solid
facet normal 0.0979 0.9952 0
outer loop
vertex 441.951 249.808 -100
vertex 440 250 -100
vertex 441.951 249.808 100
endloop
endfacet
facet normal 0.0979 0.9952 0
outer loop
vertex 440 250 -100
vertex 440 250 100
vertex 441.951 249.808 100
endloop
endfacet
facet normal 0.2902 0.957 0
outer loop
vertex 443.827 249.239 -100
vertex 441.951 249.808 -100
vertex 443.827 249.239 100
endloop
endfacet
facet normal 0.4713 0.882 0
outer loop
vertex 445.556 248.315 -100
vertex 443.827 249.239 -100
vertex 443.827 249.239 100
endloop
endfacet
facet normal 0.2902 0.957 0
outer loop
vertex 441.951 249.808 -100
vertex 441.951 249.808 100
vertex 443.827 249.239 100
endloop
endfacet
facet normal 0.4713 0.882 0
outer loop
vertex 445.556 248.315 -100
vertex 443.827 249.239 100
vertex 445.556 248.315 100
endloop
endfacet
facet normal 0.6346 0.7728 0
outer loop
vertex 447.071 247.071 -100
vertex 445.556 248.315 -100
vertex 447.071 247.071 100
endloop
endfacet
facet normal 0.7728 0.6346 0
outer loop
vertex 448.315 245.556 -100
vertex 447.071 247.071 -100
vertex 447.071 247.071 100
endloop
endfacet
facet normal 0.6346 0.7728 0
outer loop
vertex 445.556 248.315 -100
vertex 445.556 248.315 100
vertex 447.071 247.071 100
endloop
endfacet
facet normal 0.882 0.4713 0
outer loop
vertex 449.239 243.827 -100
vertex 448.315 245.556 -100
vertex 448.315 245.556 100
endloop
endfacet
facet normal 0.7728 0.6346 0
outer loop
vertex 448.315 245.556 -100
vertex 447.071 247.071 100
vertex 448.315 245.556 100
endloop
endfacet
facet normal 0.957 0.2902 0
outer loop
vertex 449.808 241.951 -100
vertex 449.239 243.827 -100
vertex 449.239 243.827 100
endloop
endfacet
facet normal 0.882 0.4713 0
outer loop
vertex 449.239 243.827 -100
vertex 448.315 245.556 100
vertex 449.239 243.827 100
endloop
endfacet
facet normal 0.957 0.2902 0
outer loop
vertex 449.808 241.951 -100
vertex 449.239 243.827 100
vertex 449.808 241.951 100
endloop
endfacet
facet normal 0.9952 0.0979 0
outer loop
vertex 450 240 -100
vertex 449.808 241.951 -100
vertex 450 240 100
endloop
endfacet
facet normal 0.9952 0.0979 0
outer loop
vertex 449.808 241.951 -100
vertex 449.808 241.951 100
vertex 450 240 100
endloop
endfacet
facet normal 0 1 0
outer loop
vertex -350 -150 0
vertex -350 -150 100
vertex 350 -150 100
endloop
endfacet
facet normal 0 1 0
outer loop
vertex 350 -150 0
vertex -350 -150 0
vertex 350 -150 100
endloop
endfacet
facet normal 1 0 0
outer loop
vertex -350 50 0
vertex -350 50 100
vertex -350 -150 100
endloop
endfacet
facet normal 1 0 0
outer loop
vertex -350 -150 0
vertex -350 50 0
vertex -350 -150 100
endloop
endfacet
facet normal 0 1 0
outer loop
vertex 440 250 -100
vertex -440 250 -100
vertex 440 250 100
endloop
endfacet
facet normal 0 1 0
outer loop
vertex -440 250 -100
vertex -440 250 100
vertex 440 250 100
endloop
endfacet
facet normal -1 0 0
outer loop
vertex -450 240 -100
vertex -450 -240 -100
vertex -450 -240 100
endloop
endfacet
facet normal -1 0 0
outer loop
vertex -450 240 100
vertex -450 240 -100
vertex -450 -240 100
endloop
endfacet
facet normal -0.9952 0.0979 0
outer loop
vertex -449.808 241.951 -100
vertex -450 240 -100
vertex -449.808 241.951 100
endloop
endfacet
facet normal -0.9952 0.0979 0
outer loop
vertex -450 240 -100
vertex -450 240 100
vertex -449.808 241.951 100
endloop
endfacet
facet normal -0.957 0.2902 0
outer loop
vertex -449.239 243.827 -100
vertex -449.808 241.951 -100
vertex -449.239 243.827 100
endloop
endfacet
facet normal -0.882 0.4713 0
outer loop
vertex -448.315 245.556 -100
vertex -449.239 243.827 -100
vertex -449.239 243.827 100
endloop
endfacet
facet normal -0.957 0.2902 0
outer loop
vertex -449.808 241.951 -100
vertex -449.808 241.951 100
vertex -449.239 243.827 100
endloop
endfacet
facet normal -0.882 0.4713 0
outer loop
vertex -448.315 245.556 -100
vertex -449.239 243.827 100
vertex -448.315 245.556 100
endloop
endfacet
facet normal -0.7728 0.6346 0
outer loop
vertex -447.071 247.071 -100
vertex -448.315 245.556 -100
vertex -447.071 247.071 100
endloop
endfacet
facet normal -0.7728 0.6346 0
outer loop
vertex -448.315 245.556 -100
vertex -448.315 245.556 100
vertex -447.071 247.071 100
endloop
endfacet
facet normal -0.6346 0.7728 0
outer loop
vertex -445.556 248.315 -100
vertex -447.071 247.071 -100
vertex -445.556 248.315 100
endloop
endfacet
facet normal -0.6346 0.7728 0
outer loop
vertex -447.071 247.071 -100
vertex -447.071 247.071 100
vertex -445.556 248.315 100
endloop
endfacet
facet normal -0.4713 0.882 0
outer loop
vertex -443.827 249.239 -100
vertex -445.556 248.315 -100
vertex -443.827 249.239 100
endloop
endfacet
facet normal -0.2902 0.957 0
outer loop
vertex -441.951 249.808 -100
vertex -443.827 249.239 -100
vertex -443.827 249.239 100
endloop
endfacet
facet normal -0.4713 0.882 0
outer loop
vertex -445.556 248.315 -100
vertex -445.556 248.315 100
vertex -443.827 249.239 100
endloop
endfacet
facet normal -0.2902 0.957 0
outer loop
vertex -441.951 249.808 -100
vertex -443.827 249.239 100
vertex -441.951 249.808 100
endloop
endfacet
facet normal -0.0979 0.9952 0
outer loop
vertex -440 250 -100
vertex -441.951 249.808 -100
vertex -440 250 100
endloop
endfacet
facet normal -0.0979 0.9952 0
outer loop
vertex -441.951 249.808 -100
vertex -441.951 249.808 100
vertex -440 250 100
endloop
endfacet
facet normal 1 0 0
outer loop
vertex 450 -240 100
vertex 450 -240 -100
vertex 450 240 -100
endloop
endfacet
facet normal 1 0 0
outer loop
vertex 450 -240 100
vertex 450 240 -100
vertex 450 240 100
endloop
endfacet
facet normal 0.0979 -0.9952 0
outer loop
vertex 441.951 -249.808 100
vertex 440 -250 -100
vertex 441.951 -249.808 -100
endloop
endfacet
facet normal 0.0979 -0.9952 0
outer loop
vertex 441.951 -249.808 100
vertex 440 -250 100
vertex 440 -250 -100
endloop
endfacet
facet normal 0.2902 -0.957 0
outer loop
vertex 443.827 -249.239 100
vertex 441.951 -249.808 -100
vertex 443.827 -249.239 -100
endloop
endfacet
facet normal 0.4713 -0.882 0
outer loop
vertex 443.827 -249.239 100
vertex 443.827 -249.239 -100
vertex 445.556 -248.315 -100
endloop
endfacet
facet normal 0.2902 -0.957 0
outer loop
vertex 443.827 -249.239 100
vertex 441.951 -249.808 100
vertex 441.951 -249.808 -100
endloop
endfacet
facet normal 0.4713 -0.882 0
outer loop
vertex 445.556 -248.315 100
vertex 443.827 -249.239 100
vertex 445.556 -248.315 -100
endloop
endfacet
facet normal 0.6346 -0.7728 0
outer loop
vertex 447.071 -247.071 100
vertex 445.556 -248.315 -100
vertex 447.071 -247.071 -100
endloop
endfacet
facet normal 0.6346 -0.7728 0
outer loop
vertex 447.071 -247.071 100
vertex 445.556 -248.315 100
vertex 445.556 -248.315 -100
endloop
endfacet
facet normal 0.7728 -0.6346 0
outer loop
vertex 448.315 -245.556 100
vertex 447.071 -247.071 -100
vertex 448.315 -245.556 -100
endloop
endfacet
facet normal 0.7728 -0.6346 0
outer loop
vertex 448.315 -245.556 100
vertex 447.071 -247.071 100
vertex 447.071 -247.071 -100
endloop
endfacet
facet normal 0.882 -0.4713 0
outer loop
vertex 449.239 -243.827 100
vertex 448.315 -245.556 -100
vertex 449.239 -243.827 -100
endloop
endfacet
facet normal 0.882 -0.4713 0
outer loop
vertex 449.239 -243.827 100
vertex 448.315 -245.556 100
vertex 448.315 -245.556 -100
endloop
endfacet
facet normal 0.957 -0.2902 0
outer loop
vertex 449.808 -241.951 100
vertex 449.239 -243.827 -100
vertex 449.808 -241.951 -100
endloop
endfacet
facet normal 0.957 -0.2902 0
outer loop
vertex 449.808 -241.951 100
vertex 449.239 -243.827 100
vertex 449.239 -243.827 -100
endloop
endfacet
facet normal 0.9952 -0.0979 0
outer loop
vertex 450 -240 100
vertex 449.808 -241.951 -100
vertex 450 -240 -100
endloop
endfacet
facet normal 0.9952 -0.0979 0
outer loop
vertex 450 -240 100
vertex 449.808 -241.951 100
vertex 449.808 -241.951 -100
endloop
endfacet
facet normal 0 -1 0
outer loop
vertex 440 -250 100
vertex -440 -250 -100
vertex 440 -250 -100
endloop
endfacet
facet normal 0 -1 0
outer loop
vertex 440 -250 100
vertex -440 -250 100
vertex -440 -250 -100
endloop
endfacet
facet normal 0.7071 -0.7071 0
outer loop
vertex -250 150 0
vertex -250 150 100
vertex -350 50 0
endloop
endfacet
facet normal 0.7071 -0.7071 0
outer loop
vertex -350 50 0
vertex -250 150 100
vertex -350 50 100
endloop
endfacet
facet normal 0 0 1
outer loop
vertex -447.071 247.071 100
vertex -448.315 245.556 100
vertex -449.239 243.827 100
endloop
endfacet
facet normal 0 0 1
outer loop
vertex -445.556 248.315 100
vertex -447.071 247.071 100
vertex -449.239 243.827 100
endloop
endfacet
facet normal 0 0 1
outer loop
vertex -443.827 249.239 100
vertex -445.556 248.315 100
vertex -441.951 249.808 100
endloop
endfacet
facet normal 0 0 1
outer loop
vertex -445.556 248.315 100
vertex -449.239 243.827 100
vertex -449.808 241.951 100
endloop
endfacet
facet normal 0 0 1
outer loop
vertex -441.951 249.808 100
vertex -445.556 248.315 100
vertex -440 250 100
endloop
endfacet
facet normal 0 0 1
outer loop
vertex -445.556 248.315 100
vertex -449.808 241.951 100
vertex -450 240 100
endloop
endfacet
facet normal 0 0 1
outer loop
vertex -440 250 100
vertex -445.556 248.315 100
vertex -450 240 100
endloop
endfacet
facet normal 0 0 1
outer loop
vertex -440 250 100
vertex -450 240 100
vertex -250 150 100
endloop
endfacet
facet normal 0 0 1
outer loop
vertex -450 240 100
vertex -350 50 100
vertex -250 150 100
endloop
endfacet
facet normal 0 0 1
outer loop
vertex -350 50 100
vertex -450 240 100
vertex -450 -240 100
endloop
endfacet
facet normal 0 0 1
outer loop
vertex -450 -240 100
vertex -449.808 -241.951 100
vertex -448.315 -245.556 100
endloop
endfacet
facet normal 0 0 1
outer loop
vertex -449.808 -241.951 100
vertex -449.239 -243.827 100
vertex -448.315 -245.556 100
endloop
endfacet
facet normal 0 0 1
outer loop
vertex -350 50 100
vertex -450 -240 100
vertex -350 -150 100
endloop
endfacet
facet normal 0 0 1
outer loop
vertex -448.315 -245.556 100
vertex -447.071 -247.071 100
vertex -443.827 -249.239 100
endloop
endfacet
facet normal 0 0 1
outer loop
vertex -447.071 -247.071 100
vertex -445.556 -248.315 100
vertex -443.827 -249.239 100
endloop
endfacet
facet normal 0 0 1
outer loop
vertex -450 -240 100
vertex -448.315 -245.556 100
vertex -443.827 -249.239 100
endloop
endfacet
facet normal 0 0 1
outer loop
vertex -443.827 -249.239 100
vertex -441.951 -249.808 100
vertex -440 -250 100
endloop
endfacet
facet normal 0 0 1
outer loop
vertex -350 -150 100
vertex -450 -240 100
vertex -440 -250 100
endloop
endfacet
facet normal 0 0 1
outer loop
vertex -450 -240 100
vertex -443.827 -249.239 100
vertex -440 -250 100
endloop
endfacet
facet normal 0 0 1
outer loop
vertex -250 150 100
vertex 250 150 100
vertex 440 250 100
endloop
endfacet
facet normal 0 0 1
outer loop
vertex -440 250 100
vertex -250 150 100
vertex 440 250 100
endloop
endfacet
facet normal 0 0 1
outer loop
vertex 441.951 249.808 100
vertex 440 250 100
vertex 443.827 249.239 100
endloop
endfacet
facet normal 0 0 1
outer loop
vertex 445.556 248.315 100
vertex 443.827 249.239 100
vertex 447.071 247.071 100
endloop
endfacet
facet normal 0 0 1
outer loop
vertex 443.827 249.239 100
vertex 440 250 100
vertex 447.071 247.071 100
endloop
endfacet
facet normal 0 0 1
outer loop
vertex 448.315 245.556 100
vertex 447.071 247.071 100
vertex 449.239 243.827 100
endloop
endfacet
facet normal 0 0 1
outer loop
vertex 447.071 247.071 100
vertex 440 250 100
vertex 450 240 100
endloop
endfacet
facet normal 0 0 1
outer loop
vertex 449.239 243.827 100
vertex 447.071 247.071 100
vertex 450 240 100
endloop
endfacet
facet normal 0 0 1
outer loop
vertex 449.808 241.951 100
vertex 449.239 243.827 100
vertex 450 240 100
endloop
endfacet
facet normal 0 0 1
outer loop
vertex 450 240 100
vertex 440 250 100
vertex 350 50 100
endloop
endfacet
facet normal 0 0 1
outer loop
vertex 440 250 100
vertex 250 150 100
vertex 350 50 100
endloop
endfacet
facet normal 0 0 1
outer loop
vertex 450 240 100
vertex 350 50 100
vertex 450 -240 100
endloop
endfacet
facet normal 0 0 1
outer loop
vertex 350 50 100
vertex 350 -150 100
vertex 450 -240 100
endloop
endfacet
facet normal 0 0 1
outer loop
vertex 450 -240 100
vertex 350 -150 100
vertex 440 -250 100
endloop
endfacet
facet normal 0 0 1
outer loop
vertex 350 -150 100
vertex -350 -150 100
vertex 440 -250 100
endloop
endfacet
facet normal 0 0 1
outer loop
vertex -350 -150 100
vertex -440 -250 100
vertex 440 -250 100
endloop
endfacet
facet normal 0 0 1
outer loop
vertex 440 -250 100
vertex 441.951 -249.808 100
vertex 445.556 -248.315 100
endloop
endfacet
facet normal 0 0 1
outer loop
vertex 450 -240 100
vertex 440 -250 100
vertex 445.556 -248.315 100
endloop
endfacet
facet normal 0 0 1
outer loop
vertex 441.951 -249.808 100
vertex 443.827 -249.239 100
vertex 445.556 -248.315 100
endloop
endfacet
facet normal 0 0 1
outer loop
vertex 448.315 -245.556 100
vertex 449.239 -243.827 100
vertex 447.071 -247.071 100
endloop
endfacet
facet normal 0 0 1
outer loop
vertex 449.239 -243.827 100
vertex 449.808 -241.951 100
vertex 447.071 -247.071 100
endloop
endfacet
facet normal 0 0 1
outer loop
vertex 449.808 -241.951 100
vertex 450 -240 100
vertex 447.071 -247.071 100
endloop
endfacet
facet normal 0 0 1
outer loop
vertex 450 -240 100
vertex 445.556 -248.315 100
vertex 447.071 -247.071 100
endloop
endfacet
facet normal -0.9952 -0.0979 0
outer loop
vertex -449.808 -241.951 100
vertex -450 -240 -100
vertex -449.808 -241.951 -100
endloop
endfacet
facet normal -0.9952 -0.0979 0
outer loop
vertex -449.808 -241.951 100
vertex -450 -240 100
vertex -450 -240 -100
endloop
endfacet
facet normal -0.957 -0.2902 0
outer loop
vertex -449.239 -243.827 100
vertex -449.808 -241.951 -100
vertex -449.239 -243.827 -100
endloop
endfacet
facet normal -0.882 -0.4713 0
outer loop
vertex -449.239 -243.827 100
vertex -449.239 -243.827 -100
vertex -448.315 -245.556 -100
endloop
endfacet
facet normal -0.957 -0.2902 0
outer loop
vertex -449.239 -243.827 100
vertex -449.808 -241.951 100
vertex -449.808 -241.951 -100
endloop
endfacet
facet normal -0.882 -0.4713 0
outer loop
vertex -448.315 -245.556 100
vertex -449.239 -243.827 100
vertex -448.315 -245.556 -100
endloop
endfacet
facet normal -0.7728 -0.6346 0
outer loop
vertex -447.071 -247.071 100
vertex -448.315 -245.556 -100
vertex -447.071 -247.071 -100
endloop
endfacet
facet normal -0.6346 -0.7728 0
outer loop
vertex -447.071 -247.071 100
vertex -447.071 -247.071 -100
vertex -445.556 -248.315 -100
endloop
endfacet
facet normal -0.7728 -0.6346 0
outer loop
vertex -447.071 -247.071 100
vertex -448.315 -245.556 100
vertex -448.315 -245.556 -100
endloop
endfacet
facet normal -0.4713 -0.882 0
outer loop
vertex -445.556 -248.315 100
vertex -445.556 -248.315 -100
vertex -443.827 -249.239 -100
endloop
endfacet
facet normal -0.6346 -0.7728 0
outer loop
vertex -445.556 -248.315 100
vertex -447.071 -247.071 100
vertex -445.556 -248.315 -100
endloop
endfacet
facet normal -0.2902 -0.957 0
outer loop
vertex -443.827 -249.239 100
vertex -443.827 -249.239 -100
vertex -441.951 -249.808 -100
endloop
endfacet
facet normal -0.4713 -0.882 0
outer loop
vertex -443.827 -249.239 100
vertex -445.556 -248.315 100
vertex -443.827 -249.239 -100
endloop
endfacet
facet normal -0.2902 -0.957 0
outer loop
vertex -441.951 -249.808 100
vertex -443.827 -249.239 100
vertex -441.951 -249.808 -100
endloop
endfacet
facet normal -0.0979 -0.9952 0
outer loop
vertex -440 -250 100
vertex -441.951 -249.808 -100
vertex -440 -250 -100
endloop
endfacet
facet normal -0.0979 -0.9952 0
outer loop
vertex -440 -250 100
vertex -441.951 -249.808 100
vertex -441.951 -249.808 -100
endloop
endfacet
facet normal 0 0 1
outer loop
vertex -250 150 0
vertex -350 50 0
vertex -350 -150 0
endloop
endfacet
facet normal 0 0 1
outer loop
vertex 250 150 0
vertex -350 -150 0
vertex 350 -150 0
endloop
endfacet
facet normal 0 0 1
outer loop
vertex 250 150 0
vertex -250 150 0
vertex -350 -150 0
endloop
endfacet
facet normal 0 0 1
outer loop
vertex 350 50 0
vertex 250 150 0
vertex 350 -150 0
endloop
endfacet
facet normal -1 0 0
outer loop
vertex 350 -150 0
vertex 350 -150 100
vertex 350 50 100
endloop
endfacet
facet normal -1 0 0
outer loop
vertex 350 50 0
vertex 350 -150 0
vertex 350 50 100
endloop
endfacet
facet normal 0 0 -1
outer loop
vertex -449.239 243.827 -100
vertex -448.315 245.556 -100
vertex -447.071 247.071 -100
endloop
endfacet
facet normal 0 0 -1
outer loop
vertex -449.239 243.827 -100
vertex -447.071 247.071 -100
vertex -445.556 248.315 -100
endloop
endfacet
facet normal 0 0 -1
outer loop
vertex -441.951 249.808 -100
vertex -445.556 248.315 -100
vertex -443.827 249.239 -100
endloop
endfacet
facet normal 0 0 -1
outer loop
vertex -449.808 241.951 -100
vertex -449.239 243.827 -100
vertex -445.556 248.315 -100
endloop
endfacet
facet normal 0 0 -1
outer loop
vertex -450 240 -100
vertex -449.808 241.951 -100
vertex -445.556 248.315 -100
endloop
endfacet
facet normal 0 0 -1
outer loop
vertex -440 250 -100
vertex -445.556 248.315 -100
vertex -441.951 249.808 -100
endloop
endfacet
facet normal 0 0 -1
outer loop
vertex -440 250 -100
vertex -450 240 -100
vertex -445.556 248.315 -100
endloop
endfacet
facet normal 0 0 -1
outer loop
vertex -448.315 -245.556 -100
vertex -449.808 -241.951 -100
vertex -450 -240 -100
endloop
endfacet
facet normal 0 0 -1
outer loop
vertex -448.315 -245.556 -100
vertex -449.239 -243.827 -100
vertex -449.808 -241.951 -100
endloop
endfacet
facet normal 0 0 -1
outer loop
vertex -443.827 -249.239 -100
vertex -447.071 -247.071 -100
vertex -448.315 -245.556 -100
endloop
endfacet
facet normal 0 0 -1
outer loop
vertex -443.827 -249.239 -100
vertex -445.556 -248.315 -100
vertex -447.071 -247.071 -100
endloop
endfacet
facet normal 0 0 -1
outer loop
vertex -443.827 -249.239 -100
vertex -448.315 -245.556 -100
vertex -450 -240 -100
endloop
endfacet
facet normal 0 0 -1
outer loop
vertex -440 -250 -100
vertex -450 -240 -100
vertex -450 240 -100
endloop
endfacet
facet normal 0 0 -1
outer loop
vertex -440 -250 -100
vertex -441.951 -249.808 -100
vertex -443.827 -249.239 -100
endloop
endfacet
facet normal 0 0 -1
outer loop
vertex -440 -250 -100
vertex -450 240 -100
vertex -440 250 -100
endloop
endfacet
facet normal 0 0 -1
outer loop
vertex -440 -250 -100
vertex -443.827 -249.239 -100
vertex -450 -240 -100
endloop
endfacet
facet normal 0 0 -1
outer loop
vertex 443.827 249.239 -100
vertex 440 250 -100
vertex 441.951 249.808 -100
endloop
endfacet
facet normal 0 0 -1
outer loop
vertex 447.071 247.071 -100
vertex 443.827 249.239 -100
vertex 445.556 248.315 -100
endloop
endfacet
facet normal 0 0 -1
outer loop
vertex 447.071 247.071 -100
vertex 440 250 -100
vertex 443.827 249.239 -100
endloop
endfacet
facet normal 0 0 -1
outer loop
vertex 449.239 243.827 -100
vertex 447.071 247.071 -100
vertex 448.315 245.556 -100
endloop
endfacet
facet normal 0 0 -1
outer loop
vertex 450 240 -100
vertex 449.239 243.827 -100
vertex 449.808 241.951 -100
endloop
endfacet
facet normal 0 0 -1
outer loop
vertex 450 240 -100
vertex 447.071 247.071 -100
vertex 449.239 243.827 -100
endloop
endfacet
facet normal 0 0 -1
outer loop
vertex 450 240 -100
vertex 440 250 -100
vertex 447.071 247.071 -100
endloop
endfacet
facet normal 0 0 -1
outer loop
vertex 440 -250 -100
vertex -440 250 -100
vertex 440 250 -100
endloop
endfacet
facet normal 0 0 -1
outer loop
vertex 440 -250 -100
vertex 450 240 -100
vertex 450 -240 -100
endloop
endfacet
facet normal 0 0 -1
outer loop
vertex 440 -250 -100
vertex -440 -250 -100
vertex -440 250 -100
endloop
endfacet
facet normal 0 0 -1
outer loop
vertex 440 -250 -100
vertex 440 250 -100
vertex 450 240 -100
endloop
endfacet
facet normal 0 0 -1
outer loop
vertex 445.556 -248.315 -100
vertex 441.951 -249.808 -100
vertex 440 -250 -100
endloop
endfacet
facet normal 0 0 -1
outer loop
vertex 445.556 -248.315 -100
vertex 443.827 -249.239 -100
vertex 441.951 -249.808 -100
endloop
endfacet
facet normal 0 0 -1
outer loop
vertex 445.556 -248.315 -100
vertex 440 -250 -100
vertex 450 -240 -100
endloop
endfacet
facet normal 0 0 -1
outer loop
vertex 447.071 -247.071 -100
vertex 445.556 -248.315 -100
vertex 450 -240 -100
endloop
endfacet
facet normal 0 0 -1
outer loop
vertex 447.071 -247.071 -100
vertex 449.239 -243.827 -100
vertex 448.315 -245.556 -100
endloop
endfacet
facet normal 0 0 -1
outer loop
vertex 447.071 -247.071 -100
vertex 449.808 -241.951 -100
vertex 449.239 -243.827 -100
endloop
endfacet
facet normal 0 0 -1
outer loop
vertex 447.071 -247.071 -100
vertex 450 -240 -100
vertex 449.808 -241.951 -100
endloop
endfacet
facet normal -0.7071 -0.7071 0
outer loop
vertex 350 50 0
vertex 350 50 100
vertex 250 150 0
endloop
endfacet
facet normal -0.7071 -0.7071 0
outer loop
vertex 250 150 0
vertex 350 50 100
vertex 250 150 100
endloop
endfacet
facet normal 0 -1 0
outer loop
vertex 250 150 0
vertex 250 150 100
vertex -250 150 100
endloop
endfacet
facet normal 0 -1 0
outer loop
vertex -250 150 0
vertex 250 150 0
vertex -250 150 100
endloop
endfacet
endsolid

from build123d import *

# Parameters (mm, degrees)
F0_W     = 900
F0_H     = 200
F1_DEPTH = 250
F3_DEPTH = 100
F4_R     = 10


with BuildPart() as f1:
    # F0 (on Front) → F1 (new body, symmetric)
    with BuildSketch(Plane.XZ):
        Rectangle(F0_W, F0_H)
    extrude(amount=F1_DEPTH, both=True)

    # F2 (on face) → F3 (cut)
    with BuildSketch(Plane.XY.offset(100)):
        Polygon((-350, -150), (350, -150), (350, 50), (250, 150), (0, 150), (-250, 150), (-350, 50), align=None)
    extrude(amount=-F3_DEPTH, mode=Mode.SUBTRACT)

    # F4
    f4_edges = [f1.edges().sort_by_distance(p)[0] for p in [
        (450, -250, 0),
        (-450, -250, 0),
        (450, 250, 0),
        (-450, 250, 0),
    ]]
    fillet(f4_edges, radius=F4_R)


solid = f1.part
